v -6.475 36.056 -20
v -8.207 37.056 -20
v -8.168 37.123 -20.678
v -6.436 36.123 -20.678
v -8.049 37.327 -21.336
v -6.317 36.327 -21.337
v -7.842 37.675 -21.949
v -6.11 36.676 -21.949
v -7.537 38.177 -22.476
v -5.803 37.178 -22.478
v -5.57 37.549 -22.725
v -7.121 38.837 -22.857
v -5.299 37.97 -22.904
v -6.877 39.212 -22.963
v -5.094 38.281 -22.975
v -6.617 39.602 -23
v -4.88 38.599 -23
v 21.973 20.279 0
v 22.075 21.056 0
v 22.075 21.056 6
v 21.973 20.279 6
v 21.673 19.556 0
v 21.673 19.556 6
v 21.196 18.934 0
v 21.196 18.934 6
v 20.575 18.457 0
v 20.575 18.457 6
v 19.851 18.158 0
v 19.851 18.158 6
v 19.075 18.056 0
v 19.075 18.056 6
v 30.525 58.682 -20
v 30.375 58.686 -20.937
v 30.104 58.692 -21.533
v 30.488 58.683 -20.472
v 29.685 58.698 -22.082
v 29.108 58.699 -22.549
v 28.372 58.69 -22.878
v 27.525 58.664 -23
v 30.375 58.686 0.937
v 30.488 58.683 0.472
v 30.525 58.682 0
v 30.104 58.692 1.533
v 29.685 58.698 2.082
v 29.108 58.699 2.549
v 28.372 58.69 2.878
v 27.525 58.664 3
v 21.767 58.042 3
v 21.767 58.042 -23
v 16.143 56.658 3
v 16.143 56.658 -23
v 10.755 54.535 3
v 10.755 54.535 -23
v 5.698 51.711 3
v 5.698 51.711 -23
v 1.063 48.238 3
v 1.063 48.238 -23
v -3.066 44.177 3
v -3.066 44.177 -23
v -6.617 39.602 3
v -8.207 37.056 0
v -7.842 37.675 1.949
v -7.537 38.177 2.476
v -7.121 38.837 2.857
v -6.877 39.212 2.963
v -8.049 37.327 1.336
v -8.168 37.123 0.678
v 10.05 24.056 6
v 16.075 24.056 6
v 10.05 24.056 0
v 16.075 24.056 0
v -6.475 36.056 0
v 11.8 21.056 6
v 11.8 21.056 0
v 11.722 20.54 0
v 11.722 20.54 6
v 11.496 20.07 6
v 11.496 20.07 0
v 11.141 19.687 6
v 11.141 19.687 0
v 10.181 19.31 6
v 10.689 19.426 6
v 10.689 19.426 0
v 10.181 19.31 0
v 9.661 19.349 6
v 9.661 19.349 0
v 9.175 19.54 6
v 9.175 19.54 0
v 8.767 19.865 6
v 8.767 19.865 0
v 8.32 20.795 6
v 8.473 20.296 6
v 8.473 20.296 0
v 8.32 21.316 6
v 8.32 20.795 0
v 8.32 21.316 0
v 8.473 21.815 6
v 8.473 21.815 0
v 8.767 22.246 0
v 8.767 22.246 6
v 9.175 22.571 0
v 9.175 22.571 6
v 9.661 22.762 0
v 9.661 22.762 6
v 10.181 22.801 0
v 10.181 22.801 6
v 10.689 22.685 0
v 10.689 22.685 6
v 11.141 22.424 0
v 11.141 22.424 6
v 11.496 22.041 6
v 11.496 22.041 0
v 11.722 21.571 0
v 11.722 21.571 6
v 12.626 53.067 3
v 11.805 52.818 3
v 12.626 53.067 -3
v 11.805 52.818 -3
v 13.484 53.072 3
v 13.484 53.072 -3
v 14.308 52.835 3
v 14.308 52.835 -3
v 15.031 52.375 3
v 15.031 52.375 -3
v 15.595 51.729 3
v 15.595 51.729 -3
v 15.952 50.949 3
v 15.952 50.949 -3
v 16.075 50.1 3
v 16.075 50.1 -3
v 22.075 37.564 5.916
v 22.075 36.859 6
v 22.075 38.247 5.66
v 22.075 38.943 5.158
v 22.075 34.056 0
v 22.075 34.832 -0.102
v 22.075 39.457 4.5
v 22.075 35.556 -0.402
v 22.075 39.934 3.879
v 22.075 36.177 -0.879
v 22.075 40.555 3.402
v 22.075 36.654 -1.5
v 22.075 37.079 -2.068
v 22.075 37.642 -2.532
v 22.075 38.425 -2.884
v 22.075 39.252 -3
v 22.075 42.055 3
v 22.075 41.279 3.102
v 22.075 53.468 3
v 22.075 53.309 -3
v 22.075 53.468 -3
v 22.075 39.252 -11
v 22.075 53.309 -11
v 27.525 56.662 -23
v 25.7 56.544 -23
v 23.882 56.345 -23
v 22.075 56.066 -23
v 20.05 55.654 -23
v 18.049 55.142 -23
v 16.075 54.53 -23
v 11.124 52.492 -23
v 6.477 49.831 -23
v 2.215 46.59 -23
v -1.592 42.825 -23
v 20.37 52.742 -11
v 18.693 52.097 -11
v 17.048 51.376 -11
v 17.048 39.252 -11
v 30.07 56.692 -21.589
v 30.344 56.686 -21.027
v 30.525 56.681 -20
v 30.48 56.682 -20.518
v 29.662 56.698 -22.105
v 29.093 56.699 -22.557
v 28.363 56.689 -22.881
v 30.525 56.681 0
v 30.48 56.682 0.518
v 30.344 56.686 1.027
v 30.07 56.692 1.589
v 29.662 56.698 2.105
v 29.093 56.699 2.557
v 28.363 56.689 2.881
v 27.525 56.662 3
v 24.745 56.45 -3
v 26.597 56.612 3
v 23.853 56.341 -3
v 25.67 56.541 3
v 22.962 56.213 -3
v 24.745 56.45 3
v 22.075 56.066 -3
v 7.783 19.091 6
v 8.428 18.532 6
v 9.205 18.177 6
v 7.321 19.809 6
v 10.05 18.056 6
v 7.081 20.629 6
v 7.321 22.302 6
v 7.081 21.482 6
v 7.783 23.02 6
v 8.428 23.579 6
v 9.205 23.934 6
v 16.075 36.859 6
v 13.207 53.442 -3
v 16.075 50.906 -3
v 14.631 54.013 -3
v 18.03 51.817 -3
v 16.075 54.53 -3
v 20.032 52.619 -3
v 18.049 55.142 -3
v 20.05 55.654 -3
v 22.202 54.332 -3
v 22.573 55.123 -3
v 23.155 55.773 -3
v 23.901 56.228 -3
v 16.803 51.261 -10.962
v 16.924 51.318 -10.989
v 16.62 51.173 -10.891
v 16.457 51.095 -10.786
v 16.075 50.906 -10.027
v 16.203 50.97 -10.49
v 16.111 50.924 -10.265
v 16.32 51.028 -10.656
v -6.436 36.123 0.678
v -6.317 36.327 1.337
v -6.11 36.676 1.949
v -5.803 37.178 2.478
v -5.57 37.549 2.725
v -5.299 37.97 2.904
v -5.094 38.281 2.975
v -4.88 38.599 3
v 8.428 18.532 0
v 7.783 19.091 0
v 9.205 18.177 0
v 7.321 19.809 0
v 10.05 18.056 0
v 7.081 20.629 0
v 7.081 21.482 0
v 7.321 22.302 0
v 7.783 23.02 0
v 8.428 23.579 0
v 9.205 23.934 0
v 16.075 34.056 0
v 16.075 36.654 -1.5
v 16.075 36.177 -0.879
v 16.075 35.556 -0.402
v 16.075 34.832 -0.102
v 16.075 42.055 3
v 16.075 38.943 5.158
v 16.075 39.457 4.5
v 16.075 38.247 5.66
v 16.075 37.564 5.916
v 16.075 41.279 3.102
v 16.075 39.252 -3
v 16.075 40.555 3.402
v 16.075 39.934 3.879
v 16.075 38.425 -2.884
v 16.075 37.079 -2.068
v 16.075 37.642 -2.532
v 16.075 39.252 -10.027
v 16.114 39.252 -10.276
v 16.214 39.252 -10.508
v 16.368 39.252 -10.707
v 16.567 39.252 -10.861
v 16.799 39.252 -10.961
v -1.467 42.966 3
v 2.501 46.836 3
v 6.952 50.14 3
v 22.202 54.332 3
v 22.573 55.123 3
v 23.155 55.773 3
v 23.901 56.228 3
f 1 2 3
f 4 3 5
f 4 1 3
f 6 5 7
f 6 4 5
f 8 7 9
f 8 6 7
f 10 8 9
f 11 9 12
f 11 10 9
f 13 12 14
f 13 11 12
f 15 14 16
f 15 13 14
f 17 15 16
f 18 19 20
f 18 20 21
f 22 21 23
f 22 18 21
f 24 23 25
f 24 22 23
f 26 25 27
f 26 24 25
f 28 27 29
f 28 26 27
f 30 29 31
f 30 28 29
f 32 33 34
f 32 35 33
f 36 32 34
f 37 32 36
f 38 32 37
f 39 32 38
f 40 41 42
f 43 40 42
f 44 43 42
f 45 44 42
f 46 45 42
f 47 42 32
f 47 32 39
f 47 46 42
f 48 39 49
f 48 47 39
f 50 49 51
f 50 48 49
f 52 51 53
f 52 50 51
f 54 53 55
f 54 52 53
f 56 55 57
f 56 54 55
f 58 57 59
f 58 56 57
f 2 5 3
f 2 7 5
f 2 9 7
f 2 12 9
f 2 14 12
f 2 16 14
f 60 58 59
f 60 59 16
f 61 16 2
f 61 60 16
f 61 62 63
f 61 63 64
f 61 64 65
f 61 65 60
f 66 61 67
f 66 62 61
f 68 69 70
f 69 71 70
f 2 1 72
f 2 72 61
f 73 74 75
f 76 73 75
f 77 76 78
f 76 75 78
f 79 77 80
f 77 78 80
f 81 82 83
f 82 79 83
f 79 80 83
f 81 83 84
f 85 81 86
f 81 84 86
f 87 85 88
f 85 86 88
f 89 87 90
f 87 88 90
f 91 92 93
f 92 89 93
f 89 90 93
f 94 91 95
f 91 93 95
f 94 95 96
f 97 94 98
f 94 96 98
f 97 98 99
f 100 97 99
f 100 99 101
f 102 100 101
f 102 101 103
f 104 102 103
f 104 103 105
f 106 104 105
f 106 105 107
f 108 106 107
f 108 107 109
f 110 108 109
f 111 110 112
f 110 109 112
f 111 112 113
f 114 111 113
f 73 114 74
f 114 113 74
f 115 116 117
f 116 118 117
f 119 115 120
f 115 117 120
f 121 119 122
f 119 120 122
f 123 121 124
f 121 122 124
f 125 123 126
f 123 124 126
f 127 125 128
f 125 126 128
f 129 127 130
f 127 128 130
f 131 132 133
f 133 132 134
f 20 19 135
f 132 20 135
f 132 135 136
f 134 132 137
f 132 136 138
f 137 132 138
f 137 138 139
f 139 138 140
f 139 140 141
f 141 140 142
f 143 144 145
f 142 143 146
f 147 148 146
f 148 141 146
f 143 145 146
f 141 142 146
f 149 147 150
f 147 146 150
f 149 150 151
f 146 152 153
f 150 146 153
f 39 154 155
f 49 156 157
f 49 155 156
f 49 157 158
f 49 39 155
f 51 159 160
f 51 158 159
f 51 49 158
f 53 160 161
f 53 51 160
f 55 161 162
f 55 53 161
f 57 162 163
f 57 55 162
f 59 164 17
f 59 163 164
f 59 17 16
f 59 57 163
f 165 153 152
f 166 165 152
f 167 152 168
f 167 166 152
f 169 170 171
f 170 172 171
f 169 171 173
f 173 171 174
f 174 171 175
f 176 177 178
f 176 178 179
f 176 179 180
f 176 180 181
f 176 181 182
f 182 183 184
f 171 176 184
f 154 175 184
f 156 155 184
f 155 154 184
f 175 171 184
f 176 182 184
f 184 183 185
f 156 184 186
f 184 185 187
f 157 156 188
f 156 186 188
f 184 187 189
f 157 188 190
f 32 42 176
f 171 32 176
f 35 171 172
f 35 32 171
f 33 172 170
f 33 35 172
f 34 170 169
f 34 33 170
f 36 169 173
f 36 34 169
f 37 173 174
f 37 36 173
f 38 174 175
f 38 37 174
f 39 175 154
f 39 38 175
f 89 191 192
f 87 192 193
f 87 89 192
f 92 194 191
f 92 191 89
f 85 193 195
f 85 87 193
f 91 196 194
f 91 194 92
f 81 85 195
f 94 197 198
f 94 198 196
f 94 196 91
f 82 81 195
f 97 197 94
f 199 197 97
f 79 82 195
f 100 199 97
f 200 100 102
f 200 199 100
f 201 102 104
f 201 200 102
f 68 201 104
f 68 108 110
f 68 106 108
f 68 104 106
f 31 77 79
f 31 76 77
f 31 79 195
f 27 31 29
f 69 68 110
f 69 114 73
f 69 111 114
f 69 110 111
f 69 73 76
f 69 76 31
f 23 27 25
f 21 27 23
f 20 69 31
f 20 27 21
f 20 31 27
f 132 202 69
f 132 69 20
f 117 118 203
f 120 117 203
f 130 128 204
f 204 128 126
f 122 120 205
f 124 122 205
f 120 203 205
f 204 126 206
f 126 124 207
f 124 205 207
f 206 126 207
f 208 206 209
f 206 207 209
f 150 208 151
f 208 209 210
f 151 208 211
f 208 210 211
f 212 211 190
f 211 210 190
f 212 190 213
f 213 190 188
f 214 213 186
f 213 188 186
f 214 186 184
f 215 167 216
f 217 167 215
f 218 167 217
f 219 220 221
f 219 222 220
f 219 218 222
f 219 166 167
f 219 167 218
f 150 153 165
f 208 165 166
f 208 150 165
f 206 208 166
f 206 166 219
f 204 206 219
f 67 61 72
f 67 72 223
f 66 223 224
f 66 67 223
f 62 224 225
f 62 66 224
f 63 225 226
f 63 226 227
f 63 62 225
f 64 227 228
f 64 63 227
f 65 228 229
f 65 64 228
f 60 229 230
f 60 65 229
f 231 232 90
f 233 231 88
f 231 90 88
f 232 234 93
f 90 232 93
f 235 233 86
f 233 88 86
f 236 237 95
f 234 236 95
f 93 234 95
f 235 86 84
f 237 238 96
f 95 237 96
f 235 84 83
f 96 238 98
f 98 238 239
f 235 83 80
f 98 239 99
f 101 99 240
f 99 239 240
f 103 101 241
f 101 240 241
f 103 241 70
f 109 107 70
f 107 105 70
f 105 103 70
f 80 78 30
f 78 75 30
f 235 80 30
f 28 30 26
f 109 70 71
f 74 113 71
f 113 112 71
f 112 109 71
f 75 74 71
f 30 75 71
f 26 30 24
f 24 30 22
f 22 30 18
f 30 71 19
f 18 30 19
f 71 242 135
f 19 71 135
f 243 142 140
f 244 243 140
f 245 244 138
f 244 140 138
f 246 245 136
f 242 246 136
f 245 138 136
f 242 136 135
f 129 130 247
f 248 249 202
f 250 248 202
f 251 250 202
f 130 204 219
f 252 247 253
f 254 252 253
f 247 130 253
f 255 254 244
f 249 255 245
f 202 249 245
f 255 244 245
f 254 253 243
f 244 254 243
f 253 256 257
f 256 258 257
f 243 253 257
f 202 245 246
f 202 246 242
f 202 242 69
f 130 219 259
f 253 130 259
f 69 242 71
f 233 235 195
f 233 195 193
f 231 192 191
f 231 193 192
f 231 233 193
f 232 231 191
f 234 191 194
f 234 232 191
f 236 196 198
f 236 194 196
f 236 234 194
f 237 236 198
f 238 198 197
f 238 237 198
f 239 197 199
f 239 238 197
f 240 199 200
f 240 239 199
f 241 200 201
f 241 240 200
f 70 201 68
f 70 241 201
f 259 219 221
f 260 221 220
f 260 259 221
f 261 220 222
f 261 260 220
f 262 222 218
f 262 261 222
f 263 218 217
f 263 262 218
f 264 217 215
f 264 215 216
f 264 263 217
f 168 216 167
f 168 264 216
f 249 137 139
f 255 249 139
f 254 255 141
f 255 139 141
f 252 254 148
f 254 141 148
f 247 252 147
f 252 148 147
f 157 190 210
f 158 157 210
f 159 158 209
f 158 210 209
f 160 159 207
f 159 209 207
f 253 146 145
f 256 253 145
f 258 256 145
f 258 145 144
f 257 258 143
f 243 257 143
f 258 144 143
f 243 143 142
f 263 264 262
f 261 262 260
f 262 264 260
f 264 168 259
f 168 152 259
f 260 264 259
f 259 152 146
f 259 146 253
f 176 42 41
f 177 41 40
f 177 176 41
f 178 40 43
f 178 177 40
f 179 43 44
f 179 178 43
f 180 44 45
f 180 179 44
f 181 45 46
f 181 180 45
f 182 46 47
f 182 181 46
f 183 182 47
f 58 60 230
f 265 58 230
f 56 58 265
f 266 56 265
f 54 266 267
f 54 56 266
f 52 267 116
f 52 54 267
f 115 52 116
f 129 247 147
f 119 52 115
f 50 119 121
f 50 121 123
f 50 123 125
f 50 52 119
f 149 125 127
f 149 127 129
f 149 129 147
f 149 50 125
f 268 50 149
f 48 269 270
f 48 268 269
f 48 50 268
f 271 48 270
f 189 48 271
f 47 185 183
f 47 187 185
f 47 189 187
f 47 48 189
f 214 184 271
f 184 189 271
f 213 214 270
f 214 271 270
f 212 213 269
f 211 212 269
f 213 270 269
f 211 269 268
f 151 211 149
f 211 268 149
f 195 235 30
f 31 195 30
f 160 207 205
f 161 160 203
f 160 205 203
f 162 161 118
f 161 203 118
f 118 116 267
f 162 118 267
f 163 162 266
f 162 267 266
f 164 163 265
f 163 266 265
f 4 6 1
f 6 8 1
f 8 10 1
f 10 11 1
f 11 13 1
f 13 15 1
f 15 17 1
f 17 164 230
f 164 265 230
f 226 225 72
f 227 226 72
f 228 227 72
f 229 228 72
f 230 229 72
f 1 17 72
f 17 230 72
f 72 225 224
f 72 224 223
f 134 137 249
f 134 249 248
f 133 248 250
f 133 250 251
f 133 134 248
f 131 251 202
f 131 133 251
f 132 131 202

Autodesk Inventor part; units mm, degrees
ref_plane "YZ Plane" through (0, 0, 0) normal (1, 0, 0) x (0, 1, 0)
ref_plane "XY Plane" through (0, 0, 0) normal (0, 0, 1) x (1, 0, 0)
sketch "Sketch1" plane through (0, 0, 0) normal (0, 0, 1) x (1, 0, 0)
  circle A0 centre (10.05, 11) radius 1.75
  arc A1 (13.575, 6.828427) -> (12.575, 7) centre (12.575, 4) ccw
  line L0 (13.575, 25.055513) -> (13.575, 6.828427)
  arc A2 (13.582607, 25.229787) -> (13.575, 25.055513) centre (15.575, 25.055513) ccw
  arc A3 (12.575, 25.055513) -> (13.582607, 25.229787) centre (12.575, 28.055513) ccw
  line L1 (7.525, 25.055513) -> (12.575, 25.055513)
  arc A4 (6.525, 25.227086) -> (7.525, 25.055513) centre (7.525, 28.055513) ccw
  line L2 (6.525, 6.828427) -> (6.525, 25.227086)
  arc A5 (7.525, 7) -> (6.525, 6.828427) centre (7.525, 4) ccw
  line L3 (12.575, 7) -> (7.525, 7)
  circle A6 centre (10.05, 21.055513) radius 1.75
  line L4 (10.05, 18.055513) -> (22.075, 18.055513)
  line L5 (22.075, 18.055513) -> (22.075, 56.065748)
  circle A7 centre (18.075, 30.055513) radius 1.75
  circle A8 centre (59, 30.055513) radius 1.75
  circle A9 centre (50.975, 2) radius 1.75
  circle A10 centre (10.05, 2) radius 1.75
  line L6 (3.525, -2) -> (3.525, 34.055513)
  arc A11 (3.525, -2) -> (63.525, -2) centre (33.525, 16.027756) ccw
  line L7 (63.525, 34.055513) -> (63.525, -2)
  arc A12 (63.525, 34.055513) -> (3.525, 34.055513) centre (33.525, 16.027756) ccw
  arc A13 (30.525, 56.680798) -> (-6.475, 36.055513) centre (29.281483, 15.411497) ccw
  arc A14 (30.525, 58.681663) -> (-8.207051, 37.055513) centre (29.281483, 15.411497) ccw
  line L8 (16.075, 54.530422) -> (16.075, 24.055513)
  line L9 (16.075, 24.055513) -> (10.05, 24.055513)
  arc A15 (10.05, 24.055513) -> (10.05, 18.055513) centre (10.05, 21.055513) ccw
  line L10 (-6.475, 36.055513) -> (-8.207051, 37.055513)
  line L11 (30.525, 56.680798) -> (30.525, 58.681663)
  line L12 (15.575, 28.055513) -> (15.575, 32.055513)
  point P0 (0, 0)
  point P1 (30.525, 57.681231)
  dimension "d0" = 6
  dimension "d1" = 6
  dimension "d2" = 3
  dimension "d3" = 2
  dimension "d4" = 2
  dimension "d5" = 0.5
  dimension "d6" = 60
  dimension "d22" = 10
  dimension "d23" = 2
sketch "Sketch1 outline for Extrusion1" plane through (0, 0, 0) normal (0, 0, 1) x (1, 0, 0)
  arc A0 (-6.475, 36.055513) -> (16.075, 54.530422) centre (29.281483, 15.411497) cw
  line L0 (16.075, 54.530422) -> (16.075, 24.055513)
  line L1 (16.075, 24.055513) -> (10.05, 24.055513)
  arc A1 (10.05, 24.055513) -> (10.05, 18.055513) centre (10.05, 21.055513) ccw
  line L2 (10.05, 18.055513) -> (22.075, 18.055513)
  line L3 (22.075, 18.055513) -> (22.075, 56.065748)
  arc A2 (22.075, 56.065748) -> (30.525, 56.680798) centre (29.281483, 15.411497) cw
  line L4 (30.525, 56.680798) -> (30.525, 58.681663)
  arc A3 (30.525, 58.681663) -> (-8.207051, 37.055513) centre (29.281483, 15.411497) ccw
  line L5 (-8.207051, 37.055513) -> (-6.475, 36.055513)
  circle A4 centre (10.05, 21.055513) radius 1.75
extrude "Extrusion1" add sketch "Sketch1 outline for Extrusion1" along normal blind 6
sketch "Sketch2" plane through (0, 0, 0) normal (0, 0, -1) x (-1, 0, 0)
  circle A0 centre (-10.05, 21.055513) radius 1.75
  arc A1 (6.475, 36.055513) -> (-16.075, 54.530422) centre (-29.281483, 15.411497) ccw
  line L0 (8.207051, 37.055513) -> (6.475, 36.055513)
  arc A2 (8.207051, 37.055513) -> (-30.525, 58.681663) centre (-29.281483, 15.411497) ccw
  line L1 (-30.525, 56.680798) -> (-30.525, 58.681663)
  arc A3 (-22.075, 56.065748) -> (-30.525, 56.680798) centre (-29.281483, 15.411497) ccw
  line L2 (-22.075, 18.055513) -> (-22.075, 56.065748)
  line L3 (-10.05, 18.055513) -> (-22.075, 18.055513)
  arc A4 (-10.05, 18.055513) -> (-10.05, 24.055513) centre (-10.05, 21.055513) ccw
  line L4 (-16.075, 24.055513) -> (-10.05, 24.055513)
  line L5 (-16.075, 54.530422) -> (-16.075, 24.055513)
  line L6 (-16.075, 54.530422) -> (-16.075, 24.055513)
  line L7 (-10.05, 18.055513) -> (-22.075, 18.055513)
  line L8 (-19.575, 34.055513) -> (-12.575, 34.055513)
  line L9 (-22.075, 18.055513) -> (-22.075, 56.065748)
  line L10 (-16.075, 37.055513) -> (-22.075, 37.055513)
  line L11 (-22.075, 18.055513) -> (-22.075, 56.065748)
  line L12 (-16.075, 37.055513) -> (-16.075, 54.530422)
  line L13 (-22.075, 37.055513) -> (-22.075, 56.065748)
  point P0 (0, 0)
  point P1 (-16.0625, 18.055513)
  dimension "d20" = 3
extrude "Extrusion2" add sketch "Sketch2" along normal blind 3 contours A1 L5 L10 L2 A3 L1 A2 L0
sketch "Sketch3" plane through (0, 0, 6) normal (0, 0, 1) x (1, 0, 0)
  line L0 (10.05, 18.055513) -> (22.075, 18.055513)
  line L1 (22.075, 18.055513) -> (22.075, 56.065748)
  arc A0 (30.525, 56.680798) -> (22.075, 56.065748) centre (29.281483, 15.411497) ccw
  line L2 (30.525, 56.680798) -> (30.525, 58.681663)
  arc A1 (30.525, 58.681663) -> (-8.207051, 37.055513) centre (29.281483, 15.411497) ccw
  line L3 (-8.207051, 37.055513) -> (-6.475, 36.055513)
  arc A2 (16.075, 54.530422) -> (-6.475, 36.055513) centre (29.281483, 15.411497) ccw
  line L4 (16.075, 54.530422) -> (16.075, 24.055513)
  line L5 (16.075, 24.055513) -> (10.05, 24.055513)
  arc A3 (10.05, 24.055513) -> (10.05, 18.055513) centre (10.05, 21.055513) ccw
  circle A4 centre (10.05, 21.055513) radius 1.75
  line L6 (5.525, 34.055513) -> (19.575, 34.055513)
  line L7 (16.075, 54.530422) -> (16.075, 24.055513)
  line L8 (22.075, 56.065748) -> (22.075, 18.055513)
  line L9 (16.075, 24.055513) -> (16.075, 54.530422)
  line L10 (16.075, 39.055513) -> (22.075, 39.055513)
  point P0 (0, 0)
  point P1 (22.075, 24.055513)
  point P2 (22.075, 34.055513)
  dimension "d19" = 5
extrude "Extrusion3" cut sketch "Sketch3" against normal blind 3 contours L10 L4 A2 L3 A1 L2 A0 L1
sketch "Sketch4" plane through (0, 0, -3) normal (0, 0, -1) x (-1, 0, 0)
  arc A0 (6.475, 36.055513) -> (-16.075, 54.530422) centre (-29.281483, 15.411497) ccw
  line L0 (6.475, 36.055513) -> (8.207051, 37.055513)
  arc A1 (8.207051, 37.055513) -> (-30.525, 58.681663) centre (-29.281483, 15.411497) ccw
  line L1 (-30.525, 58.681663) -> (-30.525, 56.680798)
  arc A2 (-22.075, 56.065748) -> (-30.525, 56.680798) centre (-29.281483, 15.411497) ccw
  arc A3 (-16.075, 54.530422) -> (-22.075, 56.065748) centre (-29.281486, 15.411487) ccw
  arc A4 (-22.075, 56.065748) -> (-30.525, 56.680798) centre (-29.281483, 15.411497) ccw
  line L2 (-22.075, 56.065748) -> (-22.075, 37.055513)
  line L3 (-22.075, 37.055513) -> (-16.075, 37.055513)
  line L4 (-16.075, 37.055513) -> (-16.075, 54.530422)
  point P0 (0, 0)
extrude "Extrusion4" add sketch "Sketch4" along normal blind 20 contours A0 A3 A2 L1 A1 L0
fillet "Fillet1" radius 3 7 edges at (16.075, 54.5304, 0) (22.075, 56.0657, 0) (22.075, 18.0555, 3) (-7.341, 36.5555, 3) (-7.341, 36.5555, -23) (30.525, 57.6812, -23) (30.525, 57.6812, 3)
fillet "Fillet2" radius 3 4 edges at (19.075, 39.0555, 3) (19.075, 39.0555, 6) (19.075, 37.0555, -3) (19.075, 37.0555, 0)
ref_plane "Work Plane1" through (29.281483, 58.699528, 0) normal (0, 1, 0) x (-1, 0, 0)
sketch "Sketch6" plane through (0, 0, -3) normal (0, 0, -1) x (-1, 0, 0)
  line L0 (-16.075, 39.251665) -> (-22.075, 39.251665)
  line L1 (-16.075, 39.251665) -> (-16.075, 50.100446)
  arc A0 (-11.805166, 52.818446) -> (-16.075, 50.100446) centre (-13.075, 50.100446) ccw
  arc A1 (-16.075, 54.530422) -> (-22.075, 56.065748) centre (-29.281486, 15.411487) ccw
  arc A2 (-22.075, 53.467756) -> (-24.745407, 56.449595) centre (-25.075, 53.467756) ccw
  line L2 (-22.075, 53.467756) -> (-22.075, 39.251665)
  arc A3 (-3.525, 34.055513) -> (-63.525, 34.055513) centre (-33.525, 16.027756) ccw
  arc A4 (-16.075, 48.654394) -> (-22.075, 51.211524) centre (-33.525, 16.027756) ccw
  line L3 (-22.075, 53.467756) -> (-22.075, 42.055513)
  arc A5 (-16.075, 50.906081) -> (-22.075, 53.309085) centre (-33.525, 16.027756) ccw
  line L4 (-22.075, 51.211524) -> (-22.075, 53.309085)
  line L5 (-16.075, 50.906081) -> (-16.075, 48.654394)
  line L6 (-16.075, 39.251665) -> (-16.075, 50.100446)
  line L7 (-16.075, 42.055513) -> (-16.075, 50.100446)
  line L8 (-16.075, 50.100446) -> (-22.075, 53.309085)
  arc A6 (-11.805166, 52.818446) -> (-16.075, 54.530422) centre (-29.281483, 15.411497) ccw
  arc A7 (-22.075, 56.065748) -> (-24.745407, 56.449595) centre (-29.281483, 15.411497) ccw
  point P0 (0, 0)
  dimension "d37" = 2
  dimension "d38" = 2
sketch "Sketch6 outline for Extrusion7" plane through (0, 0, -3) normal (0, 0, -1) x (-1, 0, 0)
  arc A0 (-16.075, 50.906081) -> (-22.075, 53.309085) centre (-33.525, 16.027756) ccw
  line L0 (-22.075, 53.309085) -> (-22.075, 39.251665)
  line L1 (-22.075, 39.251665) -> (-16.075, 39.251665)
  line L2 (-16.075, 39.251665) -> (-16.075, 50.906081)
extrude "Extrusion7" add sketch "Sketch6 outline for Extrusion7" along normal blind 8
fillet "Fillet6" radius 1 2 edges at (16.075, 45.0789, -11) (22.075, 46.2804, -11)
equation "\"d1\" = d0"
properties part number "obstacle bumper"
